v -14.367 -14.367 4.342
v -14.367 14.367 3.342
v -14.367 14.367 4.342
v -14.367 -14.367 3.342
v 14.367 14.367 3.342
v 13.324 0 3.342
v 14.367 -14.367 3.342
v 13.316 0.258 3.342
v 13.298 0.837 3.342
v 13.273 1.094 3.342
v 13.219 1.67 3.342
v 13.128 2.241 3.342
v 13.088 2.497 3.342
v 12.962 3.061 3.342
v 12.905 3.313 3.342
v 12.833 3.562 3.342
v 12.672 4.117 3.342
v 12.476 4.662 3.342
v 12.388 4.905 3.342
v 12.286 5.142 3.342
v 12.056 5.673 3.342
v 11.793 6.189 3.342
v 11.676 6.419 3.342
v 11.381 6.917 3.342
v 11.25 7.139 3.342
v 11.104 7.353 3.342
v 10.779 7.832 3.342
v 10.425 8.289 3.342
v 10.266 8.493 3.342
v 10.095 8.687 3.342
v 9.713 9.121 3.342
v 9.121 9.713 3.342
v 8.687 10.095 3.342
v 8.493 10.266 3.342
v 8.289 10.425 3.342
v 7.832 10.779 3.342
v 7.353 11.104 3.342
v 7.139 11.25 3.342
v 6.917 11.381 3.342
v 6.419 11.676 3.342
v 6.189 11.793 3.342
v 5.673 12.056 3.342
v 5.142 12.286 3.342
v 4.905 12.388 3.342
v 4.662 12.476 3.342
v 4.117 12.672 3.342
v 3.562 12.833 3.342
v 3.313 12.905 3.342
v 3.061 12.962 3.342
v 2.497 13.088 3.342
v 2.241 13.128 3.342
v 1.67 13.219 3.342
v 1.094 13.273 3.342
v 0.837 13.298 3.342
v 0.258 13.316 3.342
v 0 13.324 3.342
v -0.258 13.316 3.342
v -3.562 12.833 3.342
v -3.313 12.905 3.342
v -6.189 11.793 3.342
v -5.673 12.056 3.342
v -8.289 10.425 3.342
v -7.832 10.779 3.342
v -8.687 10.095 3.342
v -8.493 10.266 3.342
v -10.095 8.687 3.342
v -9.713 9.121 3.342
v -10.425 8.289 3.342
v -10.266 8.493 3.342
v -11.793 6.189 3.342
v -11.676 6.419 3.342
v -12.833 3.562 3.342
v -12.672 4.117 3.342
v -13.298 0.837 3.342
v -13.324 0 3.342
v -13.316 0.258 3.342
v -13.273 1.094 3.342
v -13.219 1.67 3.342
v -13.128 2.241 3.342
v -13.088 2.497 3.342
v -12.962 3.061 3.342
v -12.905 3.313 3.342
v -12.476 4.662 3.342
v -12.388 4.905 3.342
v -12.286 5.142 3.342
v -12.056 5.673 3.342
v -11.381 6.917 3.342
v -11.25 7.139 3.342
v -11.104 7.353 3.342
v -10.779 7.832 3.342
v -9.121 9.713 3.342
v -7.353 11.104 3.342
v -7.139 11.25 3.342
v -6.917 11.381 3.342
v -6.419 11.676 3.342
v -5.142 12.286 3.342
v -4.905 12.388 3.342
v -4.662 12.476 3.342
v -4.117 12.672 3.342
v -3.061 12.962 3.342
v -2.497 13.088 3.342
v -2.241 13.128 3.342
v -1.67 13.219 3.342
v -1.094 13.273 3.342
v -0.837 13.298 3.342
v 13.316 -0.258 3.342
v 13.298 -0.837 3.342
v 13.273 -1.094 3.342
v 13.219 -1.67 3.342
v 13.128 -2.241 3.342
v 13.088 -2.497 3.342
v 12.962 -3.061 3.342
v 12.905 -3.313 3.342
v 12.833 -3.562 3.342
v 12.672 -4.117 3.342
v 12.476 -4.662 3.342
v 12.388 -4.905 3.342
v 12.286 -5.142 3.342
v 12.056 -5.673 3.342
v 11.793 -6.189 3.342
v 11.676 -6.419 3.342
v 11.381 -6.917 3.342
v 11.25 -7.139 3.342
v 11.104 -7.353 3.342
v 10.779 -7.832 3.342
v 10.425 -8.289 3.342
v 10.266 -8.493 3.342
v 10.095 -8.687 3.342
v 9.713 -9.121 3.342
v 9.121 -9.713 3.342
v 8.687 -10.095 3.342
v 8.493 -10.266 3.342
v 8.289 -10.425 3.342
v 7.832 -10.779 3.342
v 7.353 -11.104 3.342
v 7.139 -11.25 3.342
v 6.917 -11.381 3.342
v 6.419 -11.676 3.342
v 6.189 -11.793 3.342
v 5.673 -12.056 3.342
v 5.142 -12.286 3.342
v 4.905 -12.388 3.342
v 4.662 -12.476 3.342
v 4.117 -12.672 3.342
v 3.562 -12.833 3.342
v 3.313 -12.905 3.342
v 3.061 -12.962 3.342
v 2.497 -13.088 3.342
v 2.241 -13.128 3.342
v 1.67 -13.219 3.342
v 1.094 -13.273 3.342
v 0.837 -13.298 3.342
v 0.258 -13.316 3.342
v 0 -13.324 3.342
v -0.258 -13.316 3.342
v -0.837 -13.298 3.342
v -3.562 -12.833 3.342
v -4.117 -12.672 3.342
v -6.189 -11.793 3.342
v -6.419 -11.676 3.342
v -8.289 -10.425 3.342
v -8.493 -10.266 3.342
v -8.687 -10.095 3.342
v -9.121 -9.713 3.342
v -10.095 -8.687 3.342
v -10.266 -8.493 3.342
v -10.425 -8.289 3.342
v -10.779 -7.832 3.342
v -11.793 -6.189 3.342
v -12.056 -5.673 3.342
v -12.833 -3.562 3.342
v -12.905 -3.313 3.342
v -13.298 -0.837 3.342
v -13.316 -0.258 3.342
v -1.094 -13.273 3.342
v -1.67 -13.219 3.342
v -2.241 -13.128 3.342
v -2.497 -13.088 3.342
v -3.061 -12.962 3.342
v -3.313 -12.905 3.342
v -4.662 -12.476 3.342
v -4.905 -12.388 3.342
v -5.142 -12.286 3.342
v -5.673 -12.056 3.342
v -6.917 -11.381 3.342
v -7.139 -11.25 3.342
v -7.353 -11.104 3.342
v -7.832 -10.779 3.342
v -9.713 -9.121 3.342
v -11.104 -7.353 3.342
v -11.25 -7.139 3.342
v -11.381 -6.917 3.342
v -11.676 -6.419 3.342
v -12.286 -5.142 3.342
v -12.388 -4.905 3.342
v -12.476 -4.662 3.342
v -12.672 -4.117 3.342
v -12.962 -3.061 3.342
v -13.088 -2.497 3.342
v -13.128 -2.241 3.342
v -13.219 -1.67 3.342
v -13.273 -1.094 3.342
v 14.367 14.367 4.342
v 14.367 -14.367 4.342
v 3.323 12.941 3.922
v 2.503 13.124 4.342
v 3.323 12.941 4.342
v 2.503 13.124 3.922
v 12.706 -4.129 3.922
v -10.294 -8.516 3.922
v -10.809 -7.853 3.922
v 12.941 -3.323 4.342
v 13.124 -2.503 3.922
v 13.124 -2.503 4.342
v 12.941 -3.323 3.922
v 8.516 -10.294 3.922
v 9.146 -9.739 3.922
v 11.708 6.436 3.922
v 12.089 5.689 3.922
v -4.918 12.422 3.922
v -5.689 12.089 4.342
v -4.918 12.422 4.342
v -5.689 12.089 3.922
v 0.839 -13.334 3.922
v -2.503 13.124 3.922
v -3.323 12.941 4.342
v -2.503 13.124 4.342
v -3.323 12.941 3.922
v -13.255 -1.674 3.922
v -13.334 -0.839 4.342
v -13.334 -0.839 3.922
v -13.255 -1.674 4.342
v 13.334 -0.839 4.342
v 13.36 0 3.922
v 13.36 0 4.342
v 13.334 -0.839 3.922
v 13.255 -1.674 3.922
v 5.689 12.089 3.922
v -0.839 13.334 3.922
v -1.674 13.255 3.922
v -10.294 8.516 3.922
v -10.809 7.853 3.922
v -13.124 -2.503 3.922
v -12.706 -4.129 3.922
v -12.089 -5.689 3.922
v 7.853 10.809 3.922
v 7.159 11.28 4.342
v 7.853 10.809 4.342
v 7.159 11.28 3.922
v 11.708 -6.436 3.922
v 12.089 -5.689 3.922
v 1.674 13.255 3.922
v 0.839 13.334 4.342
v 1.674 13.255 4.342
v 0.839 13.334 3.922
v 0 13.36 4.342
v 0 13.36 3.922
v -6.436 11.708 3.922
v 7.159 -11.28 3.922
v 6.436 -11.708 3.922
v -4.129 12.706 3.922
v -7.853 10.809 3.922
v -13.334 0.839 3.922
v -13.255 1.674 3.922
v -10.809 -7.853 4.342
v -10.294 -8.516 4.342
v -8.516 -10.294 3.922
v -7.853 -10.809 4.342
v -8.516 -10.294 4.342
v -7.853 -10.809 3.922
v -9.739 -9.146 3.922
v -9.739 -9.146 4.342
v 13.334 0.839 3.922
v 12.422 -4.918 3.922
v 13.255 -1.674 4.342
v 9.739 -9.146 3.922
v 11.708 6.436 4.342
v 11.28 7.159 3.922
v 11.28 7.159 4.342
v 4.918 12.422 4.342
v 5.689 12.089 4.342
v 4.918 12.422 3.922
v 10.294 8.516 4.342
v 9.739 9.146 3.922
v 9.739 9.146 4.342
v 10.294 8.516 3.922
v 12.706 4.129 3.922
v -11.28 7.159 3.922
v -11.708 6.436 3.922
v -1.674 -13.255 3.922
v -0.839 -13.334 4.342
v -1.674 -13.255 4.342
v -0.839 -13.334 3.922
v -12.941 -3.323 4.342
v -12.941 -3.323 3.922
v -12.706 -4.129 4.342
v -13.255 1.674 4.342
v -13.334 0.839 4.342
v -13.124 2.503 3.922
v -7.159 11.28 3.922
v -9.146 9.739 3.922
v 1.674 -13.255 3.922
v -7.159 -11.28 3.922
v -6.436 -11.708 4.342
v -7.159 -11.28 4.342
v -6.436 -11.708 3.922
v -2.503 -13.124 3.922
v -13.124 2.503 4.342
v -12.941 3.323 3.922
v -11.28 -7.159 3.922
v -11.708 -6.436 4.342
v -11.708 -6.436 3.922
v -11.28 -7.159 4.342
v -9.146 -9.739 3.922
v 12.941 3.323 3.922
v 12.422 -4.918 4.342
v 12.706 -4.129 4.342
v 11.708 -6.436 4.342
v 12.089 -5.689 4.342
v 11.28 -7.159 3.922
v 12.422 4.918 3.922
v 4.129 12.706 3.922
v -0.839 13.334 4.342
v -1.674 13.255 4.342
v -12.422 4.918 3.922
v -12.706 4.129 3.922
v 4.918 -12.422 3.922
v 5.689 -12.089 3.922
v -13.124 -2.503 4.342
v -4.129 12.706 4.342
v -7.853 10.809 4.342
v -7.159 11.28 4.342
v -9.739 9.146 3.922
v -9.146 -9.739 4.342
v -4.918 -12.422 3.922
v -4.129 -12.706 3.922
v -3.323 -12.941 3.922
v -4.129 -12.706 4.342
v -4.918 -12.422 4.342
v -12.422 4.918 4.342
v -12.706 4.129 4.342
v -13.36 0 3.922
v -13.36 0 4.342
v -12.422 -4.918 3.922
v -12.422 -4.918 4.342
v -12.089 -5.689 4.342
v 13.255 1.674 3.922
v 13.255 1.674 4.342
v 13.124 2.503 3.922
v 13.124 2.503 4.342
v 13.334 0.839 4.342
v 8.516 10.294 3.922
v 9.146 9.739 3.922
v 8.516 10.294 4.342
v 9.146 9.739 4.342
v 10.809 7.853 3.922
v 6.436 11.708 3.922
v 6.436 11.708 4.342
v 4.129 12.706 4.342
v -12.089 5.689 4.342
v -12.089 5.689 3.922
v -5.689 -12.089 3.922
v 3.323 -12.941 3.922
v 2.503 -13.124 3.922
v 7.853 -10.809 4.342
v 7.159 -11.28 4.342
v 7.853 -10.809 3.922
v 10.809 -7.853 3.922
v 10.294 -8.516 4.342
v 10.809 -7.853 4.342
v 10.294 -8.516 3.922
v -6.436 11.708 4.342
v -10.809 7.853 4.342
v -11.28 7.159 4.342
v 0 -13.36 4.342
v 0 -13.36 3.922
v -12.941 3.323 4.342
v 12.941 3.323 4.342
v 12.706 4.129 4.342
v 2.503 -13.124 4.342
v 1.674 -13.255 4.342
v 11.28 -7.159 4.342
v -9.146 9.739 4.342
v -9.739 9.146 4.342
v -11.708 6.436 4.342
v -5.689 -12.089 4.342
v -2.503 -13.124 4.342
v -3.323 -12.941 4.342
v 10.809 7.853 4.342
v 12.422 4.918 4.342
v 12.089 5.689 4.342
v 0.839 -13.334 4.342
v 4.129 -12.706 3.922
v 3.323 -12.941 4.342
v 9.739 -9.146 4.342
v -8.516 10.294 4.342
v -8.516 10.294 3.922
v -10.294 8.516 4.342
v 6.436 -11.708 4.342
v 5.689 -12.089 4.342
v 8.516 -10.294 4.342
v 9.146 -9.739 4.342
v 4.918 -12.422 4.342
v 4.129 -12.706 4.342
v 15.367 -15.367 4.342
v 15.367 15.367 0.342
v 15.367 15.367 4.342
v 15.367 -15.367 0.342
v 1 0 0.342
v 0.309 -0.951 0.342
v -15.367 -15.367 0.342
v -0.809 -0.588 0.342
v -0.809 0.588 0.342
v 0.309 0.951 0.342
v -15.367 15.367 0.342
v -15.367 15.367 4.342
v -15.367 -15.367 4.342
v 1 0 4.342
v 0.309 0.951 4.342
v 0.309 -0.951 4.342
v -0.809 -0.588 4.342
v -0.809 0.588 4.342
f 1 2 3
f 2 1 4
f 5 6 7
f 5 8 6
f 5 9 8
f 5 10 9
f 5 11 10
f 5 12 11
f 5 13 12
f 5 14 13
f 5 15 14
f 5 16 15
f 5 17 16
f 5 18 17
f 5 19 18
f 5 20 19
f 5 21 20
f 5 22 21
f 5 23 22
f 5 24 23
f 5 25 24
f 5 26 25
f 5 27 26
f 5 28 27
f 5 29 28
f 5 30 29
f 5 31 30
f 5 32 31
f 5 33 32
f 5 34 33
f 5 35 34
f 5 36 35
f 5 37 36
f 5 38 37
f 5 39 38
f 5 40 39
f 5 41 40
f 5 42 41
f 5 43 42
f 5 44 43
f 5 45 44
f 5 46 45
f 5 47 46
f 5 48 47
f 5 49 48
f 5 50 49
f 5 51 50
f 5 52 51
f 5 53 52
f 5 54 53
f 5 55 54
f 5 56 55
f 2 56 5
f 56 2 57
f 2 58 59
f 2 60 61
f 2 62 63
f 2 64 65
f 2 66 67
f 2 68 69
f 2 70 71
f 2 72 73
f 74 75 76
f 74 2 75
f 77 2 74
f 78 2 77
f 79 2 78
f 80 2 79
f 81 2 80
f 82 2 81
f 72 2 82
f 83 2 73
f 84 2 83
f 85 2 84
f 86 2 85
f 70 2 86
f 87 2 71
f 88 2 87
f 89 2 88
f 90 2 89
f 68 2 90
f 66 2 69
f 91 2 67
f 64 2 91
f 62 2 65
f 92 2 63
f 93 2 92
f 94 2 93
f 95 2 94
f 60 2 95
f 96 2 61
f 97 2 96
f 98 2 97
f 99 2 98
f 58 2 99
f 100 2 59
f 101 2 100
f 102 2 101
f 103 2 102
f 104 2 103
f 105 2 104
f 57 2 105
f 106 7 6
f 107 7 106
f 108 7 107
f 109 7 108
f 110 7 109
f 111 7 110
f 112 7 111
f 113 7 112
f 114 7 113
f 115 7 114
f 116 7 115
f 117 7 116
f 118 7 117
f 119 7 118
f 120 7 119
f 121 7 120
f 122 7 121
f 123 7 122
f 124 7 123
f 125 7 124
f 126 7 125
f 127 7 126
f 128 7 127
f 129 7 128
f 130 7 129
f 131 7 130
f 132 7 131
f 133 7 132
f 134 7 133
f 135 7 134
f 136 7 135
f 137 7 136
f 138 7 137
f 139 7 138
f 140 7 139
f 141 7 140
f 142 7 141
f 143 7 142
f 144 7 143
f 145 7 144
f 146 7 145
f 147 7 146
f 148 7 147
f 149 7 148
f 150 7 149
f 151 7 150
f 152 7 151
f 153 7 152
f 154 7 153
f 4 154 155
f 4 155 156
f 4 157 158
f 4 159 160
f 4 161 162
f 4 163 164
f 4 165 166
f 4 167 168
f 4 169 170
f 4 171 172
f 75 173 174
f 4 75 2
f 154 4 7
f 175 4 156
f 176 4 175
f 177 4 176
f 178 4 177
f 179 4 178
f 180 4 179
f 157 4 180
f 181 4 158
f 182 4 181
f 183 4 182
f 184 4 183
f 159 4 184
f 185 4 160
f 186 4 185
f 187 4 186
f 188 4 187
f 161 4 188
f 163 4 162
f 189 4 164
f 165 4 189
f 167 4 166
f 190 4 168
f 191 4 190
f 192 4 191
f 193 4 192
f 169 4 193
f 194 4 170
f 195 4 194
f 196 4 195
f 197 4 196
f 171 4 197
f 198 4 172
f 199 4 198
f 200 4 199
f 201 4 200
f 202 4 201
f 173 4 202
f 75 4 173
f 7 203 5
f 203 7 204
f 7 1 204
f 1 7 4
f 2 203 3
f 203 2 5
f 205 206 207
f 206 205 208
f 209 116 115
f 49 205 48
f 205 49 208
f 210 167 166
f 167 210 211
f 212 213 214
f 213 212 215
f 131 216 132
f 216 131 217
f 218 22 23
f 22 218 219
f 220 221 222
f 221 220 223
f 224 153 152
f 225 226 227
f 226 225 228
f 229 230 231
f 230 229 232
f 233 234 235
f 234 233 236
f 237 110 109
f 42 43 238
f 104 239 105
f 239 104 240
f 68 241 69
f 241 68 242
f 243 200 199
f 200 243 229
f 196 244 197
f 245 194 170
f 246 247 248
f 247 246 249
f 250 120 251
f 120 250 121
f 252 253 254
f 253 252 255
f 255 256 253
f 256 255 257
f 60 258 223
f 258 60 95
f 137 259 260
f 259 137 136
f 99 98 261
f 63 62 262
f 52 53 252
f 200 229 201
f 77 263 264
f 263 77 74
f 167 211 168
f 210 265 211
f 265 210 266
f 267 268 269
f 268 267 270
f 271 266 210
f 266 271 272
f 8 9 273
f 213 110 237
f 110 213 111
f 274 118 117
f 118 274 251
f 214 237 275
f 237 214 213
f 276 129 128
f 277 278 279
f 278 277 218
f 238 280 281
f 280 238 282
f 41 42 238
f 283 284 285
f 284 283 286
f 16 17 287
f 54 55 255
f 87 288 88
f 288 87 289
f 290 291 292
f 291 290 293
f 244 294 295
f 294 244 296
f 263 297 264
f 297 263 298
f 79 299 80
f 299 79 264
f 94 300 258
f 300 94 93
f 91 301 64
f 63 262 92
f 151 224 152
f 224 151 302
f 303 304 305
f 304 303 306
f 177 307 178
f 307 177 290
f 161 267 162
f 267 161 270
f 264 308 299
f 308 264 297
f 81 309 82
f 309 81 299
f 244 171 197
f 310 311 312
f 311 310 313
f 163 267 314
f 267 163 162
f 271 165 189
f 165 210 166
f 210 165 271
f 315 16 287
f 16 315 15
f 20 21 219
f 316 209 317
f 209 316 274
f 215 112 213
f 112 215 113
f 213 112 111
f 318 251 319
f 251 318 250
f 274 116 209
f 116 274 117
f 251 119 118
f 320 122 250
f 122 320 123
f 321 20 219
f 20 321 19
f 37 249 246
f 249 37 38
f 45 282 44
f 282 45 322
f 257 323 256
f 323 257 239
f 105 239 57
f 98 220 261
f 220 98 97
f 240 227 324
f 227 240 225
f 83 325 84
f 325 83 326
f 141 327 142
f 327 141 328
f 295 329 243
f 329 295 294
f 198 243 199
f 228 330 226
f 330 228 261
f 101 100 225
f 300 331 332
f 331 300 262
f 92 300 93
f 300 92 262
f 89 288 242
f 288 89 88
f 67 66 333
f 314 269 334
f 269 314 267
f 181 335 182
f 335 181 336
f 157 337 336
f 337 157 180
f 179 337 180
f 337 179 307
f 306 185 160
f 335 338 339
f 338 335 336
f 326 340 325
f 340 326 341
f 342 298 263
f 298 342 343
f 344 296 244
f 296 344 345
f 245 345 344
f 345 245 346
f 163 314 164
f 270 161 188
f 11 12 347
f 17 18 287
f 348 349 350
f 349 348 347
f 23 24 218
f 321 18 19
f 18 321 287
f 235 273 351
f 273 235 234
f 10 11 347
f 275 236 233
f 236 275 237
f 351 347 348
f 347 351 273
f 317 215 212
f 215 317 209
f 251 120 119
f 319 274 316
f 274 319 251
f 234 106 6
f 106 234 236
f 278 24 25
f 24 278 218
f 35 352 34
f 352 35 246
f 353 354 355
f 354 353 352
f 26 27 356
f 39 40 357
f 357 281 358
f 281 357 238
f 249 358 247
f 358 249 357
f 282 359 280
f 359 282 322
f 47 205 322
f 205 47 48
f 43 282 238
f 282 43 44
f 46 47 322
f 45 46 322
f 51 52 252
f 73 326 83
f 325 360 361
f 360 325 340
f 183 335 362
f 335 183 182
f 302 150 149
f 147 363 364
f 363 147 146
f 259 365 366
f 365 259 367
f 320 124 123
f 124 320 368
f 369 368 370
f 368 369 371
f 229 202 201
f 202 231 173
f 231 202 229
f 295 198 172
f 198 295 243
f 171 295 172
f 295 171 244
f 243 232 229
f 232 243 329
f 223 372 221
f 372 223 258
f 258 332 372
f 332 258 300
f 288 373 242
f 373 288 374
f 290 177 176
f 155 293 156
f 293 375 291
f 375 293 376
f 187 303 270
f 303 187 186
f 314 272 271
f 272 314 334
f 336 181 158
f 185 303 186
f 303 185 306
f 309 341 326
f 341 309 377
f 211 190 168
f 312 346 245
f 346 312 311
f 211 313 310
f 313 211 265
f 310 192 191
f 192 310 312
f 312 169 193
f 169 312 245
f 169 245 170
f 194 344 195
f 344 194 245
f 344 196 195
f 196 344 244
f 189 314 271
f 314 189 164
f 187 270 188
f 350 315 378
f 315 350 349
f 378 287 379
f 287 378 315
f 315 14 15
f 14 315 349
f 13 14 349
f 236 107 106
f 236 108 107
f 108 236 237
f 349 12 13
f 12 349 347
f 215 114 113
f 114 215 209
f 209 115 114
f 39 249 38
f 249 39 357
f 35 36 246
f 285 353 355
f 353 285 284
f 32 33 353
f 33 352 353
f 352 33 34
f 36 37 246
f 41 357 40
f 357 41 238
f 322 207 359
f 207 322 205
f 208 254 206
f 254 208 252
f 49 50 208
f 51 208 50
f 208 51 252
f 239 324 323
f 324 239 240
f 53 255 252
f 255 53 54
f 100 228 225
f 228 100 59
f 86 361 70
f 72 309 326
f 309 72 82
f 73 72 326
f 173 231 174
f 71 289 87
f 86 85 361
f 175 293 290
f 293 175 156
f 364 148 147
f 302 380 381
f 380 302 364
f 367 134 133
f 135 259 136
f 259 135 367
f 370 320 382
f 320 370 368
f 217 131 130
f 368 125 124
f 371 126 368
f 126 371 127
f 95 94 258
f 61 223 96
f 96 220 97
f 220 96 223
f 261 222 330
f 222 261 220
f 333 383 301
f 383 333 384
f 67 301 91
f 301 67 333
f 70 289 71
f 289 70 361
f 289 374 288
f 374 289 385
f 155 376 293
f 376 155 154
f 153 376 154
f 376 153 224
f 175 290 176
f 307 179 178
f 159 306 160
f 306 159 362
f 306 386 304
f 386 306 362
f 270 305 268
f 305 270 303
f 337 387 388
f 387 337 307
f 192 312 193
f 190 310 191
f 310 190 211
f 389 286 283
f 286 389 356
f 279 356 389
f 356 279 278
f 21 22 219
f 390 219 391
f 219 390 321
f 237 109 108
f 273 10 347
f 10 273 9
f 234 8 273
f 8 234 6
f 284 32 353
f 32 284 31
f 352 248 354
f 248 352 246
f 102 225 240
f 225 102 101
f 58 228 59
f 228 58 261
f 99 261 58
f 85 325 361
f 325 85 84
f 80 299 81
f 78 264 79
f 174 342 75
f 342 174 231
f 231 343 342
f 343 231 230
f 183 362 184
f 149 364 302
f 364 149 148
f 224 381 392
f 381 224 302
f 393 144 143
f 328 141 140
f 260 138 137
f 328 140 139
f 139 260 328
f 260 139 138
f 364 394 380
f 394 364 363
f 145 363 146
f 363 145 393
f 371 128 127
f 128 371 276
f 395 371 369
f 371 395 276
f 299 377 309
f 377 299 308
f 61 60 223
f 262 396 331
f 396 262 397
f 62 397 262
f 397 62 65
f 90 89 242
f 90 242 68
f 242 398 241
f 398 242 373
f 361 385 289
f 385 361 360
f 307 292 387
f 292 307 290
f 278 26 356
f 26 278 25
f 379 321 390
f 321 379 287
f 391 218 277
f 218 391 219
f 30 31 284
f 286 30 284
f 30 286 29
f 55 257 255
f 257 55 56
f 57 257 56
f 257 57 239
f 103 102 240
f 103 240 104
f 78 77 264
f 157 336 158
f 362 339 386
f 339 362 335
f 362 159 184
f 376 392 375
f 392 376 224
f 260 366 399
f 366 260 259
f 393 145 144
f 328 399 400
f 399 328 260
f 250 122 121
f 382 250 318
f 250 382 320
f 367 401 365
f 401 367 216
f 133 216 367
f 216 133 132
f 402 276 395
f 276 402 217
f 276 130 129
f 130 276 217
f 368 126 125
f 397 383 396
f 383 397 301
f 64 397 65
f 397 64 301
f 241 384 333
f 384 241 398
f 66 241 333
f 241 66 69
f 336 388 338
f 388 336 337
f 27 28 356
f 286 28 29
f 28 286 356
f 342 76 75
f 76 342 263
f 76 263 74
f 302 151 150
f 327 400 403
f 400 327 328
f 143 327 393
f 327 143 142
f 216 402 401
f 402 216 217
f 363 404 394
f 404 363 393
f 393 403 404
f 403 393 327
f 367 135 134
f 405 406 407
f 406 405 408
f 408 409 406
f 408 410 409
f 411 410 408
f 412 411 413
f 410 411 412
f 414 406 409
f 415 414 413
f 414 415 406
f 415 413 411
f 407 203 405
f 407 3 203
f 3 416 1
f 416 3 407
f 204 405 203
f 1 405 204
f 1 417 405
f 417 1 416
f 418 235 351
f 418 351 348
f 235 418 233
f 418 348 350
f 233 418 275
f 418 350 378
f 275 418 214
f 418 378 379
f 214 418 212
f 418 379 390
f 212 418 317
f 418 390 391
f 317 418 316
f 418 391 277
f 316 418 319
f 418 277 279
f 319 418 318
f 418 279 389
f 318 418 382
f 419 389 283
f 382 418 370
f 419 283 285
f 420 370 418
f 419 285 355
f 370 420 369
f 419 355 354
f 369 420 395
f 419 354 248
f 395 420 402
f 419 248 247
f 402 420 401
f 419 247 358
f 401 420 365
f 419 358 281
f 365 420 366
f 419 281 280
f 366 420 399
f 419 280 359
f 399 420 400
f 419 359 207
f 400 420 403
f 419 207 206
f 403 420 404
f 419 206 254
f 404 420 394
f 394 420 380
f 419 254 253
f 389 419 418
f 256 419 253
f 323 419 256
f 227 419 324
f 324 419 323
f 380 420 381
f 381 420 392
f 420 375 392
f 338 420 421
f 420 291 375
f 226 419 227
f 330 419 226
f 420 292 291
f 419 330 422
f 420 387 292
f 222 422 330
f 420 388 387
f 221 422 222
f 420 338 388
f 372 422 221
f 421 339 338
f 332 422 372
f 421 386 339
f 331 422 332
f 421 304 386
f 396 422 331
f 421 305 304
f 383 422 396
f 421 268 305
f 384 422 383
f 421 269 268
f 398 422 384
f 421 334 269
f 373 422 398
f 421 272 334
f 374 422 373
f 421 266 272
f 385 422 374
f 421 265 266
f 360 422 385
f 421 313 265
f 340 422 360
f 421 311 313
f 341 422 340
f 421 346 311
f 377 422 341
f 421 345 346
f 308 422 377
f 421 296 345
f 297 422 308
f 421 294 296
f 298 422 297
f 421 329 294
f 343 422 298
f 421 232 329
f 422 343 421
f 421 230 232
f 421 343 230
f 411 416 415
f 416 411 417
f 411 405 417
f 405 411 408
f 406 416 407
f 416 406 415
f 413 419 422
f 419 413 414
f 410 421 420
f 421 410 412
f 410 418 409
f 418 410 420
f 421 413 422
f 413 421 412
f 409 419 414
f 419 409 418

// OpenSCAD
//This script makes a lid with an injection hole for a half sphere depression in a cube - to be used for reactionware testing
// volume sphere is 4/3*pi*r^3 so volume of half sphere=(3*x/(4*3.14))^(1/3)
// area is 4*pi*r^2
//fluid in mL , 1mL=1000mm^3

//Defines the mL of fluid
x=10; 

//Defines the injection hole diameter
i=1;

a=10*pow(3/4*x/3.14, 0.3333);

module reactor()
{
difference (){
#translate([-a-1,-a-1,-1])cube([2*a+2,2*a+2,a+2]);
sphere(r=a, $fn=100);
}
}

module revreactor(){
rotate([0,180,00])reactor();
}


module lid(){ //simple square lid
difference(){
#translate([-a-2,-a-2,0])cube([2*a+4,2*a+4,4]);
revreactor();
}
}

module lidhole(){
difference(){
lid();
cylinder(a,i,i, center=true, $f=100);
}}

rotate([180,0,0])translate([0,0,-a/4-1])lidhole();
